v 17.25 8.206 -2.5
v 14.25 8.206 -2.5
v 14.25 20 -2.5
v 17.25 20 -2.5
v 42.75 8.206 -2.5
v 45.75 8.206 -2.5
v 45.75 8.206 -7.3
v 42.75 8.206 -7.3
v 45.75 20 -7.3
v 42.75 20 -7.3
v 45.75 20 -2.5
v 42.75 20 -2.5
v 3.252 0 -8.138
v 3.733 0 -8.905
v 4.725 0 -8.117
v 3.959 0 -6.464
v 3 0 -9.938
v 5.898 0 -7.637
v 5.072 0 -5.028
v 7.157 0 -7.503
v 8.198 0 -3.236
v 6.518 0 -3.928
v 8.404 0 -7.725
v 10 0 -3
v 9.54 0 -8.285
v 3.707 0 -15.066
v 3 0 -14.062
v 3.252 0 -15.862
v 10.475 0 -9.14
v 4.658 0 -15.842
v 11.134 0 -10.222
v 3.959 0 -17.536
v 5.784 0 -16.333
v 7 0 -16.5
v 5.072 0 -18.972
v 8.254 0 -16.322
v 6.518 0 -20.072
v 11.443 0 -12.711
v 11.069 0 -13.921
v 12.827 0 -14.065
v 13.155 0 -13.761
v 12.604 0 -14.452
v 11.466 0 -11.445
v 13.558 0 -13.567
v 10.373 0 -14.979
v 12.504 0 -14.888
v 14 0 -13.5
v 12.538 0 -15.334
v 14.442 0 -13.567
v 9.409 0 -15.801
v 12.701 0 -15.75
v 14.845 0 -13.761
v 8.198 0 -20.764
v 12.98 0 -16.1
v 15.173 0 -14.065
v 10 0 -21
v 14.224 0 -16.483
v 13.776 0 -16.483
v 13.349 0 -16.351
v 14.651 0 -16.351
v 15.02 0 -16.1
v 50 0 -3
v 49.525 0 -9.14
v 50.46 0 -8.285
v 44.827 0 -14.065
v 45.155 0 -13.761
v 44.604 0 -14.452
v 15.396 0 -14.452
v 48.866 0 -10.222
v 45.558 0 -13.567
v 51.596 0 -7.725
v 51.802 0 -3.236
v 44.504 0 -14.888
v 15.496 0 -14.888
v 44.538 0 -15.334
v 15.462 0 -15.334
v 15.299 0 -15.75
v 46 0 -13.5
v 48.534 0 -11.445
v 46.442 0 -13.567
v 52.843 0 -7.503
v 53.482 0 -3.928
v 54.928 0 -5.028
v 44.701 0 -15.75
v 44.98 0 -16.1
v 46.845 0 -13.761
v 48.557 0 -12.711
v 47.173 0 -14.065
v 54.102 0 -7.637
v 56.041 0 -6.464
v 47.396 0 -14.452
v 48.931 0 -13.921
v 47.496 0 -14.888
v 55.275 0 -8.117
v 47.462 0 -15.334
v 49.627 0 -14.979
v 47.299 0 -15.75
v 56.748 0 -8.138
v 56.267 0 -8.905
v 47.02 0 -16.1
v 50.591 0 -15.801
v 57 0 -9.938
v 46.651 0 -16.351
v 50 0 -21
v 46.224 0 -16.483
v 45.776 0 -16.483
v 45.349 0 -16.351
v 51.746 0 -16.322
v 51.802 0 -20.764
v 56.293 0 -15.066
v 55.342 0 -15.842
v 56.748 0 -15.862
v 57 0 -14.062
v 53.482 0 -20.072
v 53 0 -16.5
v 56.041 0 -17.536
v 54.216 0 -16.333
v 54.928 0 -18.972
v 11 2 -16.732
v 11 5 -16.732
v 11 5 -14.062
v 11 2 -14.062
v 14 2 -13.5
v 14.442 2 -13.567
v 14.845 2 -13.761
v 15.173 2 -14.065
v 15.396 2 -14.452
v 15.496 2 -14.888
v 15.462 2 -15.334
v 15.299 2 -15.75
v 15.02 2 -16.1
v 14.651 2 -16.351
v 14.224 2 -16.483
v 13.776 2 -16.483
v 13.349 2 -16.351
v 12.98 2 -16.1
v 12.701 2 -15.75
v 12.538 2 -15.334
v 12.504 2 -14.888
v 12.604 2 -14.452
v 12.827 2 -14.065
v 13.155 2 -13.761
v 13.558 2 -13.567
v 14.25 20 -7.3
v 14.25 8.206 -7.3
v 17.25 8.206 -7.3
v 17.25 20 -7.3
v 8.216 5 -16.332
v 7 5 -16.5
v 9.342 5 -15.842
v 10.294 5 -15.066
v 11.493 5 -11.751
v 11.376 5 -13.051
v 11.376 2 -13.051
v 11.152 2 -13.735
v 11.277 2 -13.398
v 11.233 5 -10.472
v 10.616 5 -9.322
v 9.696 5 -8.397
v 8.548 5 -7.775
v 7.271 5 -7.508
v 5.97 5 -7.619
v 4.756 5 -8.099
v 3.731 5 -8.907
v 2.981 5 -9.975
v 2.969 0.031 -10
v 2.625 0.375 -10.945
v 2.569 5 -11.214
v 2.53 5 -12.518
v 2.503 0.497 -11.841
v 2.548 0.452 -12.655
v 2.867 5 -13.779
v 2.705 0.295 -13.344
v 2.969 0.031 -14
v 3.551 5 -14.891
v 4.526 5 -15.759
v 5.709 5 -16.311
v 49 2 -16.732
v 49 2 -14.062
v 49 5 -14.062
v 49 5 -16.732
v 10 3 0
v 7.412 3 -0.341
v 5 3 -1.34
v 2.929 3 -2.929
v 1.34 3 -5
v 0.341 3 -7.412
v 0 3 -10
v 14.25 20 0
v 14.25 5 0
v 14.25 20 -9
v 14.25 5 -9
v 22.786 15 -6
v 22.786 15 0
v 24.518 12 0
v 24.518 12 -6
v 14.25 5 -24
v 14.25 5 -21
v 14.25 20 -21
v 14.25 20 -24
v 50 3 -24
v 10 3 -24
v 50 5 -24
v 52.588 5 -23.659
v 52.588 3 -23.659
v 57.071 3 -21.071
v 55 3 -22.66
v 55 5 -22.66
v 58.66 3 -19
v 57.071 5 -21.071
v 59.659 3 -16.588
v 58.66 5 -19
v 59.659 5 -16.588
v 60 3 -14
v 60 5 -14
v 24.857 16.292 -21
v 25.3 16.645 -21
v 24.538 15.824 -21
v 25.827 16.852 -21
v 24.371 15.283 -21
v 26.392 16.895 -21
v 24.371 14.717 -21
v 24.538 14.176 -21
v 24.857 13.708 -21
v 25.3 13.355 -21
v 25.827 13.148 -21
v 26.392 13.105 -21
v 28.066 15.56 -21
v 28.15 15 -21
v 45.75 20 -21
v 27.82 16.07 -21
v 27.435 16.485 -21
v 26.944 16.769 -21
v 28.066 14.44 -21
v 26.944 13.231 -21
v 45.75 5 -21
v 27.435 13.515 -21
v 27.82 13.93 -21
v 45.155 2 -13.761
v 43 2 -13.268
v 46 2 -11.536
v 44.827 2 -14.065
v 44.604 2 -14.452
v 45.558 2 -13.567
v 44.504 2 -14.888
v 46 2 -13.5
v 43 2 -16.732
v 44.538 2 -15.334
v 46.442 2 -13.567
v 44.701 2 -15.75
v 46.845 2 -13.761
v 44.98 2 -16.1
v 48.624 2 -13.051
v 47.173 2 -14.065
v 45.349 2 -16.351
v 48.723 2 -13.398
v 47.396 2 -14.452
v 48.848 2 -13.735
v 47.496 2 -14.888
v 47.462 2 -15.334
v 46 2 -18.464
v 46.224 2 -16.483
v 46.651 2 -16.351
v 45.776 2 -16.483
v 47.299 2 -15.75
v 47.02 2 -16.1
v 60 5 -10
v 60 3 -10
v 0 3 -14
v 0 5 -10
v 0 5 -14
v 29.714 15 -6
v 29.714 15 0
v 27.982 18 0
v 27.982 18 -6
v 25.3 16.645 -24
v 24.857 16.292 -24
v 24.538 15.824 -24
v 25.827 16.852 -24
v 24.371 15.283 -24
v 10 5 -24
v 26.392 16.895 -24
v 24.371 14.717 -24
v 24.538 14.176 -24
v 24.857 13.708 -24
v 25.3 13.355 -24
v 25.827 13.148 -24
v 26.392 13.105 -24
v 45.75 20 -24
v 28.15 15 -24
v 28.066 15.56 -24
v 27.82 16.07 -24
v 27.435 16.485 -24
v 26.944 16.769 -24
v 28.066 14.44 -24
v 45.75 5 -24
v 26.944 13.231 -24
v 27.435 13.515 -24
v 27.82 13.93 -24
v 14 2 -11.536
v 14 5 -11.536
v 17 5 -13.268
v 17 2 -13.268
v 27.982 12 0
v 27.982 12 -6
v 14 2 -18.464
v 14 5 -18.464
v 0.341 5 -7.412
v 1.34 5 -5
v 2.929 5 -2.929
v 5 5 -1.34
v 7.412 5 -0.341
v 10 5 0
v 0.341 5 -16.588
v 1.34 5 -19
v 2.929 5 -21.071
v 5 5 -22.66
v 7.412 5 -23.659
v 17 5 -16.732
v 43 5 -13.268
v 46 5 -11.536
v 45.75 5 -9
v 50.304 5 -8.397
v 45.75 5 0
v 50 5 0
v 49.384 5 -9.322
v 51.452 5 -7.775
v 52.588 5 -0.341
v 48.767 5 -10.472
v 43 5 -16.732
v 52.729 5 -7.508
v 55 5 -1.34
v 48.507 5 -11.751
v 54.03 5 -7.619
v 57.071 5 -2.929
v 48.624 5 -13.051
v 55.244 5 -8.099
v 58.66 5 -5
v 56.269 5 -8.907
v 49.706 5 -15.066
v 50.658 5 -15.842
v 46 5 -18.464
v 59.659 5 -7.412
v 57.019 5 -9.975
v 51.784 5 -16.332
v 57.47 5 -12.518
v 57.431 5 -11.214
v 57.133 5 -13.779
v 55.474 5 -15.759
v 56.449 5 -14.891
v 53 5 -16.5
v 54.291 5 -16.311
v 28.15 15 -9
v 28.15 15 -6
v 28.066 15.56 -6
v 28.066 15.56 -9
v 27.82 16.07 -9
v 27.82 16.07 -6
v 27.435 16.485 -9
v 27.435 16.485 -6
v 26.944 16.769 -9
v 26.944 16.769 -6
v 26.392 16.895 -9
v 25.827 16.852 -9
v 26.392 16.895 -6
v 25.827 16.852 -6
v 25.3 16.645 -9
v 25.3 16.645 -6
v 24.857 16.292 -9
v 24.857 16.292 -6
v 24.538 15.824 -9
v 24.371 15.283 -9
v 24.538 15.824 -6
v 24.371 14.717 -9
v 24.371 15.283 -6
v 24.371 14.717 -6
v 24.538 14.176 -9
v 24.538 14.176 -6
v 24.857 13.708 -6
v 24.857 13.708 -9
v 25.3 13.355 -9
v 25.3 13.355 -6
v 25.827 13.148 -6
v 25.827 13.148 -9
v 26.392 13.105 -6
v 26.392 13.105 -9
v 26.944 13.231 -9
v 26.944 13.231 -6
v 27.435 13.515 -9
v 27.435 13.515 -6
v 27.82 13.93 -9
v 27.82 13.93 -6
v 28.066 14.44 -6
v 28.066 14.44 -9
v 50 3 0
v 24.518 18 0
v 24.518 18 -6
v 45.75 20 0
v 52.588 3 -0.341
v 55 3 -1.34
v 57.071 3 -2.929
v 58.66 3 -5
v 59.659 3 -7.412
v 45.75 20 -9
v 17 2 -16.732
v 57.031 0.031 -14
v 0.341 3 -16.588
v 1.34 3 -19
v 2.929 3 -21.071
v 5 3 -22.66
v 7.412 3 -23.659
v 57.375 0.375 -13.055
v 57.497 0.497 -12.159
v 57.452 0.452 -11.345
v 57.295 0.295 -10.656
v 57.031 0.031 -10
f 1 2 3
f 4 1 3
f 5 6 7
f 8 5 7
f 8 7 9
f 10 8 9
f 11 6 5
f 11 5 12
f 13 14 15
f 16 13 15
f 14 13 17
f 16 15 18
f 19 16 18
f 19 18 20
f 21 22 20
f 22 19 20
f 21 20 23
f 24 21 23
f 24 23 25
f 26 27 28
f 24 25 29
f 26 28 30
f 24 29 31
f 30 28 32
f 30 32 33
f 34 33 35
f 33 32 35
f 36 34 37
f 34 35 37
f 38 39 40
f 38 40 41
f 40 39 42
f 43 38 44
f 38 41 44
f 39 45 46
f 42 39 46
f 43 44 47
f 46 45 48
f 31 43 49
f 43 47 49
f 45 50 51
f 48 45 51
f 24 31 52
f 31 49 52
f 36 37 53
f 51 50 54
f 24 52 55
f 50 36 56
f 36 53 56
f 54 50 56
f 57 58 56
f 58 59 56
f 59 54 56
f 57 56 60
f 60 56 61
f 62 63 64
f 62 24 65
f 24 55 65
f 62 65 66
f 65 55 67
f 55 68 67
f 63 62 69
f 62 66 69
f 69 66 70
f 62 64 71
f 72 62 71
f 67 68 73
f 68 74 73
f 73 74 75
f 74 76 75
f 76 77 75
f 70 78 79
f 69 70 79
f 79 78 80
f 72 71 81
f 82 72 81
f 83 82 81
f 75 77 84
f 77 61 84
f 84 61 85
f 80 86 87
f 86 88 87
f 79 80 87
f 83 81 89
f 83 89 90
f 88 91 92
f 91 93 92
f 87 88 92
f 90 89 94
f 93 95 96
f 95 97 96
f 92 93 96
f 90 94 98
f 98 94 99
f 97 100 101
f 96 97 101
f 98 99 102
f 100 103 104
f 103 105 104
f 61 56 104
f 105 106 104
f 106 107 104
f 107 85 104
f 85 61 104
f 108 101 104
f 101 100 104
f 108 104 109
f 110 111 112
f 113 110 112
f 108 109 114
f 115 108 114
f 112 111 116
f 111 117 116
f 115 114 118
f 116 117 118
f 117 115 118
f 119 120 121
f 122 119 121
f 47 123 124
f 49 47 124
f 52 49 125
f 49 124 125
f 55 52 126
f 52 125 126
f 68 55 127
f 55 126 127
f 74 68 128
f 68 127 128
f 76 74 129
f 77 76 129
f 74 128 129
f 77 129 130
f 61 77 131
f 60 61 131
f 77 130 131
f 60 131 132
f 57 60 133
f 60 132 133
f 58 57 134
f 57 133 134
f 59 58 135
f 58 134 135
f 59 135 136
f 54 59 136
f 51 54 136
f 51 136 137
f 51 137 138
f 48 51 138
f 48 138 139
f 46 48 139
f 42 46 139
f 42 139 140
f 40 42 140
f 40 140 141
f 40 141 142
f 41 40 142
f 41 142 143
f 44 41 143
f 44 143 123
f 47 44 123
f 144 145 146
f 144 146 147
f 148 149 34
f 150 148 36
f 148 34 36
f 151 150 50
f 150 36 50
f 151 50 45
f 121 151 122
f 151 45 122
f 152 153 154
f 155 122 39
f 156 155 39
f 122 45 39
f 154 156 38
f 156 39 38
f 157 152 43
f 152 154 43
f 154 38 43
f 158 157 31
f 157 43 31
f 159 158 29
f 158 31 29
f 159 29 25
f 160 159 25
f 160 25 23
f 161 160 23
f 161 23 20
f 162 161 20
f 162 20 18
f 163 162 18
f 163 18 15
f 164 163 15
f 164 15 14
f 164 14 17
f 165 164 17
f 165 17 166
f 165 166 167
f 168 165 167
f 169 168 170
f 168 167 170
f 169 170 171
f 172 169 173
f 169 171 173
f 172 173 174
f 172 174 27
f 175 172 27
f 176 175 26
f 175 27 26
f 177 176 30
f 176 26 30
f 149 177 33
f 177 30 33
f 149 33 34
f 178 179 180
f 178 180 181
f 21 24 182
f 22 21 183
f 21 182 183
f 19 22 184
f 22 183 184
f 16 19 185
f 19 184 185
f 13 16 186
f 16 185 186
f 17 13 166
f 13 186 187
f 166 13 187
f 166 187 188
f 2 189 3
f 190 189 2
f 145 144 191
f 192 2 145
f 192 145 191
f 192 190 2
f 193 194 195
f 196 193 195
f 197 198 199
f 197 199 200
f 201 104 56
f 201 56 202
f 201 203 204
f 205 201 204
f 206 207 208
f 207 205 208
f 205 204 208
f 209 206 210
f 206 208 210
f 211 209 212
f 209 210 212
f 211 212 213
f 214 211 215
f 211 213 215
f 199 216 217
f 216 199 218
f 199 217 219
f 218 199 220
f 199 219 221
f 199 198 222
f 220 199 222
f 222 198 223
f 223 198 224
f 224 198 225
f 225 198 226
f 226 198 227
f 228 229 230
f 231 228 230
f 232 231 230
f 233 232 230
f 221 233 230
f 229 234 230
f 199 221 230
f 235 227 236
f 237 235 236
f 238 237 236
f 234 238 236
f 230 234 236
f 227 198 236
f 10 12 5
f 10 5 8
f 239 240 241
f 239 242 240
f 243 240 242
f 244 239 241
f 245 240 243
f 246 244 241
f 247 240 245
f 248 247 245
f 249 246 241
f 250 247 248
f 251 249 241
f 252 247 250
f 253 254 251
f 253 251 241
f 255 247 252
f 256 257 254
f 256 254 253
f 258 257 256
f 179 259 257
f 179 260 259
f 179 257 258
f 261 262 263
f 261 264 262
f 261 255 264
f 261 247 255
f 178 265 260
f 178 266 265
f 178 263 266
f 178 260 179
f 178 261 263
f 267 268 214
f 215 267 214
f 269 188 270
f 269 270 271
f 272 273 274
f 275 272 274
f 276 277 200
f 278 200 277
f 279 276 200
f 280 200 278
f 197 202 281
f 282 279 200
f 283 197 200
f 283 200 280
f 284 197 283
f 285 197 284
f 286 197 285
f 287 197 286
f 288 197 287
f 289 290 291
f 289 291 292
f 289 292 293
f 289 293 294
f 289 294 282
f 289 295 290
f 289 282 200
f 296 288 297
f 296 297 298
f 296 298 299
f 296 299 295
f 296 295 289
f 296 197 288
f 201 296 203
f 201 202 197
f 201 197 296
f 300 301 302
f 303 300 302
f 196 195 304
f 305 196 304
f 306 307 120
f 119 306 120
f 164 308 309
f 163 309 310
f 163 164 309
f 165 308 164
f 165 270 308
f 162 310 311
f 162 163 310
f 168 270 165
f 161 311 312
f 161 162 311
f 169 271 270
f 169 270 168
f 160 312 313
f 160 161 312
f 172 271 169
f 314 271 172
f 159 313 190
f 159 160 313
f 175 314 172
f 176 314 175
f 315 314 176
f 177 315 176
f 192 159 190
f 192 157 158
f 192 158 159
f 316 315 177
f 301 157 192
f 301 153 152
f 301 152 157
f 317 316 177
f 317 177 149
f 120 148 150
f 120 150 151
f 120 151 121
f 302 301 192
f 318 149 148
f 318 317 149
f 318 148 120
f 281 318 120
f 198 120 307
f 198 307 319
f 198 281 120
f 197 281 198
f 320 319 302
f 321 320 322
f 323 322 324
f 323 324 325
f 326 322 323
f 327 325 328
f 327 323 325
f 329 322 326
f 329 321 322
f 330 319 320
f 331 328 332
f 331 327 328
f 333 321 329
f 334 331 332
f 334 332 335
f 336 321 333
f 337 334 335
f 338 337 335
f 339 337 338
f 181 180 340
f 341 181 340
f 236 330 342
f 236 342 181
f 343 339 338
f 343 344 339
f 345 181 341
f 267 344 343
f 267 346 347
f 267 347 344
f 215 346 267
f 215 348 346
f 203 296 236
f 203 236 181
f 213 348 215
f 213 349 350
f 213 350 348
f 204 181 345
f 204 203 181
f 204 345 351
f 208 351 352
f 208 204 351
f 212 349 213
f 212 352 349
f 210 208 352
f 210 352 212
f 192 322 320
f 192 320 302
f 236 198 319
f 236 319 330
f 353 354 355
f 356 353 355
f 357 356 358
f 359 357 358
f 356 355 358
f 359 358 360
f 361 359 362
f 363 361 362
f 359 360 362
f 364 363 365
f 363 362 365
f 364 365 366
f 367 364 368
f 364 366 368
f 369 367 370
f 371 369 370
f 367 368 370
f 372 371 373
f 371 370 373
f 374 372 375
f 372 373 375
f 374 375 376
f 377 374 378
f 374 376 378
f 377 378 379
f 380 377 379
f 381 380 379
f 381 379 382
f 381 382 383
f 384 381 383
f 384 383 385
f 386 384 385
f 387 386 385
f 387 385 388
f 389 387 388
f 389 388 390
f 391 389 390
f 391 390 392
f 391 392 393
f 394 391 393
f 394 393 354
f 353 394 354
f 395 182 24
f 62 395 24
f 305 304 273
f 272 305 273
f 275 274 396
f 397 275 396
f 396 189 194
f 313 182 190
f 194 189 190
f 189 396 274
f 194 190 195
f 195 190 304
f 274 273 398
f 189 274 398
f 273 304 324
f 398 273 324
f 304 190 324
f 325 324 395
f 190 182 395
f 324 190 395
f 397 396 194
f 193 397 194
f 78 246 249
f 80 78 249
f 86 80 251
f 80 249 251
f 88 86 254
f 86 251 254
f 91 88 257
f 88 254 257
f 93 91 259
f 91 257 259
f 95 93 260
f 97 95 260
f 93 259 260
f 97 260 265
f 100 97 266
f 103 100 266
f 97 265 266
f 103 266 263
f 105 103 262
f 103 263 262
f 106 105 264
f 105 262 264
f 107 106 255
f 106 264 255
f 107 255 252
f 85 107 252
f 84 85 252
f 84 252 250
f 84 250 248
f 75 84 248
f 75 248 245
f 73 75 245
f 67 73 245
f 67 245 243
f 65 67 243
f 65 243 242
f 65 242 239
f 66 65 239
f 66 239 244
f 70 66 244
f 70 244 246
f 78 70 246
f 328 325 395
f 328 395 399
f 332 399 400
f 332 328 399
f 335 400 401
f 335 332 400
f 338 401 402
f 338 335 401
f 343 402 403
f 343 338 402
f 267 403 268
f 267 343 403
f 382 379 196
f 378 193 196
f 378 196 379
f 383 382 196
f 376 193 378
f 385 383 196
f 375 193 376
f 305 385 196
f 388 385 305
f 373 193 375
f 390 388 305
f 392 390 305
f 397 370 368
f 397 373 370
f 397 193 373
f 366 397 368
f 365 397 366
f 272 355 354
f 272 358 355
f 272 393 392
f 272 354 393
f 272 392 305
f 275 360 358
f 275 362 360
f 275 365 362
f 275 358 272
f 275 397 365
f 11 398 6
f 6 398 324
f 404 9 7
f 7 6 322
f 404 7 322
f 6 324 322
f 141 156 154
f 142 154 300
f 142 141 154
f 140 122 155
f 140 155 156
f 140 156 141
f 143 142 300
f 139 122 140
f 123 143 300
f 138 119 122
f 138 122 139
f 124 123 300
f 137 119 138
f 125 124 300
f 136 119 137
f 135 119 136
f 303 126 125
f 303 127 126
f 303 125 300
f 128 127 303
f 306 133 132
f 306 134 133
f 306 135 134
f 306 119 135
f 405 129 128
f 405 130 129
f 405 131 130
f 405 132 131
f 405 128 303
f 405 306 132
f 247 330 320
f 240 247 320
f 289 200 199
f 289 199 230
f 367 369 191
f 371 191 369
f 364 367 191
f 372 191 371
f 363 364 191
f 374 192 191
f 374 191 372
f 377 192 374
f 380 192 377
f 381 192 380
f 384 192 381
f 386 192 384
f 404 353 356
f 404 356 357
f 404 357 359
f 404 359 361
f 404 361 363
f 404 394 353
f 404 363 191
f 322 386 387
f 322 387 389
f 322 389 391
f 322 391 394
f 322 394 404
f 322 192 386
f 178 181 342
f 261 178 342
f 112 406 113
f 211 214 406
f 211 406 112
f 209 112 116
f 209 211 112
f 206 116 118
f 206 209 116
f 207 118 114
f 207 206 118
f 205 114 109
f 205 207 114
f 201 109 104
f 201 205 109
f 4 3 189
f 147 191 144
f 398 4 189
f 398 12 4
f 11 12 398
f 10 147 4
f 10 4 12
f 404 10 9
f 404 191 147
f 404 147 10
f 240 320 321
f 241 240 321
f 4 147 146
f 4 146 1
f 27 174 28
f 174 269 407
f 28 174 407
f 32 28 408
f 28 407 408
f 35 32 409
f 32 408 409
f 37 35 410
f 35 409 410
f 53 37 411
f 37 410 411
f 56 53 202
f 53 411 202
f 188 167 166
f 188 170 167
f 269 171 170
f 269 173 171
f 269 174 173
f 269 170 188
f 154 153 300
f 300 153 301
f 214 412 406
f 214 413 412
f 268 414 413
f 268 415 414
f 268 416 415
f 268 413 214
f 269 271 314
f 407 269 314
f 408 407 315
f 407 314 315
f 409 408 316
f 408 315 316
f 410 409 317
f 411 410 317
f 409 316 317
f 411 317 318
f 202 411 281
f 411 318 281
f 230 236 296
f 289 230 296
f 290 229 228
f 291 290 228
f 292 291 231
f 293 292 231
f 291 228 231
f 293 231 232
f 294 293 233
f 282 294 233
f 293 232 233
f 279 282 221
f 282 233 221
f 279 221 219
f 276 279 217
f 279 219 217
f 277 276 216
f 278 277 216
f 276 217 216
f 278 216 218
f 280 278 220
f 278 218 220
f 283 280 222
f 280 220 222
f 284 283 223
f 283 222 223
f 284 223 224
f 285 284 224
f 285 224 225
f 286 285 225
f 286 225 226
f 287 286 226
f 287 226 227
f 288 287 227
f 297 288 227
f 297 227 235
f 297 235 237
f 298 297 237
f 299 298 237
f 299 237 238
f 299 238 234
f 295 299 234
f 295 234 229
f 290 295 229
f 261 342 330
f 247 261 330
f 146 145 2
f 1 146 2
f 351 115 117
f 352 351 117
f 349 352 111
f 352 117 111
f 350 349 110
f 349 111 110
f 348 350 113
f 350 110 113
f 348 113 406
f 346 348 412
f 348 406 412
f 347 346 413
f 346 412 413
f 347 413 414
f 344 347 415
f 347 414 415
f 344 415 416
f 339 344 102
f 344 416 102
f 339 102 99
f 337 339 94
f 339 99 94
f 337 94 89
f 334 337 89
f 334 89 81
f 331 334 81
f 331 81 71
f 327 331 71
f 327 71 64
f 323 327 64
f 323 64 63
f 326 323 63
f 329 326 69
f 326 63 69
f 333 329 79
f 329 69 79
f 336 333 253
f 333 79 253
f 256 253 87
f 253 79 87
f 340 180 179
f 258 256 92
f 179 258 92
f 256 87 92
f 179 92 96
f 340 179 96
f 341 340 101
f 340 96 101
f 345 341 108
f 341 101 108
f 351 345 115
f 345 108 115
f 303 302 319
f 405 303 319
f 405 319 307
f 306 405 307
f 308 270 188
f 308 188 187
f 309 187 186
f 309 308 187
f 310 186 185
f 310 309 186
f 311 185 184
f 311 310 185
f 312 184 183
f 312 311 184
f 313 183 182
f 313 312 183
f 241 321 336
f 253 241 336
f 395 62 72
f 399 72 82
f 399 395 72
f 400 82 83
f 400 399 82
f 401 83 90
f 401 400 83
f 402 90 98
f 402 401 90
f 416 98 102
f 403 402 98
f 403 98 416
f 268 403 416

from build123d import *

# Parameters (mm, degrees)
SKETCH_1_W          = 60
SKETCH_1_H          = 24
EXTRUDE_1_DEPTH     = 5
SKETCH_2_W          = 31.5
SKETCH_2_H          = 9
SKETCH_2_H_2        = 3
EXTRUDE_2_DEPTH     = 15
SKETCH_3_R          = 1.9
CUT_EXTRUDE_1_DEPTH = 24
SKETCH_4_R          = 4.5
CUT_EXTRUDE_2_DEPTH = 24
FILLET_1_R          = 10
CUT_EXTRUDE_3_DEPTH = 3
SKETCH_7_R          = 1.5
CUT_EXTRUDE_4_DEPTH = 3
CUT_EXTRUDE_5_DEPTH = 6
SKETCH_9_W          = 4.8
SKETCH_9_H          = 12.477545801
CUT_EXTRUDE_6_DEPTH = 3
SKETCH_10_W         = 4.8
SKETCH_10_H         = 29.172350056
CUT_EXTRUDE_7_DEPTH = 3
CHAMFER_1_SIZE      = 3


with BuildPart() as part:
    # Эскиз1 → Бобышка-Вытянуть1 (new body)
    with BuildSketch(Plane(origin=(0, 0, 0), x_dir=(1, 0, 0), z_dir=(0, 1, 0))):
        with Locations((30, 12)):
            Rectangle(SKETCH_1_W, SKETCH_1_H)
    extrude(amount=EXTRUDE_1_DEPTH)

    # Эскиз2 → Бобышка-Вытянуть2 (add)
    with BuildSketch(Plane(origin=(0, 5, 0), x_dir=(1, 0, 0), z_dir=(0, 1, 0))):
        with Locations((30, 4.5)):
            Rectangle(SKETCH_2_W, SKETCH_2_H)
        with Locations((30, 22.5)):
            Rectangle(SKETCH_2_W, SKETCH_2_H_2)
    extrude(amount=EXTRUDE_2_DEPTH)

    # Эскиз3 → Вырез-Вытянуть1 (cut)
    with BuildSketch(Plane.XY):
        with Locations((26.25, 15)):
            Circle(SKETCH_3_R)
    extrude(amount=-CUT_EXTRUDE_1_DEPTH, mode=Mode.SUBTRACT)

    # Эскиз4 → Вырез-Вытянуть2 (cut)
    with BuildSketch(Plane.XZ):
        with Locations(Location((7, -12, 0), (0, 0, 270))):
            Circle(SKETCH_4_R)
        with Locations(Location((53, -12, 0), (0, 0, 270))):
            Circle(SKETCH_4_R)
    extrude(amount=-CUT_EXTRUDE_2_DEPTH, mode=Mode.SUBTRACT)

    # Скругление1
    fillet_1_edges = [part.edges().sort_by_distance(p)[0] for p in [
        (0, 2.5, -24),
        (60, 2.5, -24),
        (60, 2.5, 0),
        (0, 2.5, 0),
    ]]
    fillet(fillet_1_edges, radius=FILLET_1_R)

    # Эскиз5 → Вырез-Вытянуть3 (cut)
    with BuildSketch(Plane(origin=(0, 5, 0), x_dir=(1, 0, 0), z_dir=(0, 1, 0))):
        Polygon((43, 16.732050808), (43, 13.267949192), (46, 11.535898385), (49, 13.267949192), (49, 16.732050808), (46, 18.464101615), align=None)
        Polygon((11, 16.732050808), (11, 13.267949192), (14, 11.535898385), (17, 13.267949192), (17, 16.732050808), (14, 18.464101615), align=None)
    extrude(amount=-CUT_EXTRUDE_3_DEPTH, mode=Mode.SUBTRACT)

    # Эскиз7 → Вырез-Вытянуть4 (cut)
    with BuildSketch(Plane(origin=(0, 2, 0), x_dir=(1, 0, 0), z_dir=(0, 1, 0))):
        with Locations(Location((14, 15, 0), (0, 0, 270))):
            Circle(SKETCH_7_R)
        with Locations(Location((46, 15, 0), (0, 0, 270))):
            Circle(SKETCH_7_R)
    extrude(amount=-CUT_EXTRUDE_4_DEPTH, mode=Mode.SUBTRACT)

    # Эскиз8 → Вырез-Вытянуть5 (cut)
    with BuildSketch(Plane.XY):
        Polygon((27.982050808, 18), (24.517949192, 18), (22.785898385, 15), (24.517949192, 12), (27.982050808, 12), (29.714101615, 15), align=None)
    extrude(amount=-CUT_EXTRUDE_5_DEPTH, mode=Mode.SUBTRACT)

    # Эскиз9 → Вырез-Вытянуть6 (cut)
    with BuildSketch(Plane.ZY.offset(-14.25)):
        with Locations((-4.9, 14.445052705)):
            Rectangle(SKETCH_9_W, SKETCH_9_H)
    extrude(amount=-CUT_EXTRUDE_6_DEPTH, mode=Mode.SUBTRACT)

    # Эскиз10 → Вырез-Вытянуть7 (cut)
    with BuildSketch(Plane(origin=(45.75, 0, 0), x_dir=(0, 0, -1), z_dir=(1, 0, 0))):
        with Locations((4.9, 22.792454832)):
            Rectangle(SKETCH_10_W, SKETCH_10_H)
    extrude(amount=-CUT_EXTRUDE_7_DEPTH, mode=Mode.SUBTRACT)

    # Фаска1
    # the kernel refuses this chamfer: 3 mm, written as the material it takes off along each edge
    with BuildSketch(Plane(origin=(50, 0, -24), x_dir=(0, -0.02749587661058636, 0.9996219169112968), z_dir=(-1, 0, 0))) as chamfer_1_piece_1:
        Polygon((CHAMFER_1_SIZE * 0.999621916911, CHAMFER_1_SIZE * 0.0274958766106), (-CHAMFER_1_SIZE * 0.0274958766106, CHAMFER_1_SIZE * 0.999621916911), (0, 0), align=None)
    extrude(amount=40, mode=Mode.SUBTRACT)
    with BuildSketch(Plane(origin=(0, 0, -14), x_dir=(0.9996219169112968, -0.02749587661058636, 0), z_dir=(0, 0, 1)), Plane(origin=(60, 0, -10), x_dir=(-0.9996219169112968, -0.02749587661058636, 0), z_dir=(0, 0, -1))) as chamfer_1_piece_2:
        Polygon((CHAMFER_1_SIZE * 0.999621916911, CHAMFER_1_SIZE * 0.0274958766106), (-CHAMFER_1_SIZE * 0.0274958766106, CHAMFER_1_SIZE * 0.999621916911), (0, 0), align=None)
    extrude(amount=4, mode=Mode.SUBTRACT)
    with BuildSketch(Plane(origin=(10, 0, 0), x_dir=(0, 0.9996219169112968, 0.027495876610586372), z_dir=(1, 0, 0))) as chamfer_1_piece_3:
        Polygon((CHAMFER_1_SIZE * 0.999621916911, -CHAMFER_1_SIZE * 0.0274958766106), (-CHAMFER_1_SIZE * 0.0274958766106, -CHAMFER_1_SIZE * 0.999621916911), (0, 0), align=None)
    extrude(amount=40, mode=Mode.SUBTRACT)
    with BuildSketch(Plane(origin=(10, 0, -14), x_dir=(-1, 0, 0), z_dir=(0, 0, 1))) as chamfer_1_piece_4:
        Polygon((10 - CHAMFER_1_SIZE, 0), (10, -CHAMFER_1_SIZE), (10, 0), align=None)
    revolve(axis=Axis((10, 0, -14), (0, -1, 0)), revolution_arc=90, mode=Mode.SUBTRACT)
    with BuildSketch(Plane(origin=(10, 0, -10), x_dir=(0, 0, 1), z_dir=(1, 0, 0))) as chamfer_1_piece_5:
        Polygon((10 - CHAMFER_1_SIZE, 0), (10, -CHAMFER_1_SIZE), (10, 0), align=None)
    revolve(axis=Axis((10, 0, -10), (0, -1, 0)), revolution_arc=90, mode=Mode.SUBTRACT)
    with BuildSketch(Plane(origin=(50, 0, -10), x_dir=(0, 0, 1), z_dir=(-1, 0, 0))) as chamfer_1_piece_6:
        Polygon((10 - CHAMFER_1_SIZE, 0), (10, CHAMFER_1_SIZE), (10, 0), align=None)
    revolve(axis=Axis((50, 0, -10), (0, 1, 0)), revolution_arc=90, mode=Mode.SUBTRACT)
    with BuildSketch(Plane(origin=(50, 0, -14), x_dir=(1, 0, 0), z_dir=(0, 0, 1))) as chamfer_1_piece_7:
        Polygon((10 - CHAMFER_1_SIZE, 0), (10, CHAMFER_1_SIZE), (10, 0), align=None)
    revolve(axis=Axis((50, 0, -14), (0, 1, 0)), revolution_arc=90, mode=Mode.SUBTRACT)


solid = part.part
